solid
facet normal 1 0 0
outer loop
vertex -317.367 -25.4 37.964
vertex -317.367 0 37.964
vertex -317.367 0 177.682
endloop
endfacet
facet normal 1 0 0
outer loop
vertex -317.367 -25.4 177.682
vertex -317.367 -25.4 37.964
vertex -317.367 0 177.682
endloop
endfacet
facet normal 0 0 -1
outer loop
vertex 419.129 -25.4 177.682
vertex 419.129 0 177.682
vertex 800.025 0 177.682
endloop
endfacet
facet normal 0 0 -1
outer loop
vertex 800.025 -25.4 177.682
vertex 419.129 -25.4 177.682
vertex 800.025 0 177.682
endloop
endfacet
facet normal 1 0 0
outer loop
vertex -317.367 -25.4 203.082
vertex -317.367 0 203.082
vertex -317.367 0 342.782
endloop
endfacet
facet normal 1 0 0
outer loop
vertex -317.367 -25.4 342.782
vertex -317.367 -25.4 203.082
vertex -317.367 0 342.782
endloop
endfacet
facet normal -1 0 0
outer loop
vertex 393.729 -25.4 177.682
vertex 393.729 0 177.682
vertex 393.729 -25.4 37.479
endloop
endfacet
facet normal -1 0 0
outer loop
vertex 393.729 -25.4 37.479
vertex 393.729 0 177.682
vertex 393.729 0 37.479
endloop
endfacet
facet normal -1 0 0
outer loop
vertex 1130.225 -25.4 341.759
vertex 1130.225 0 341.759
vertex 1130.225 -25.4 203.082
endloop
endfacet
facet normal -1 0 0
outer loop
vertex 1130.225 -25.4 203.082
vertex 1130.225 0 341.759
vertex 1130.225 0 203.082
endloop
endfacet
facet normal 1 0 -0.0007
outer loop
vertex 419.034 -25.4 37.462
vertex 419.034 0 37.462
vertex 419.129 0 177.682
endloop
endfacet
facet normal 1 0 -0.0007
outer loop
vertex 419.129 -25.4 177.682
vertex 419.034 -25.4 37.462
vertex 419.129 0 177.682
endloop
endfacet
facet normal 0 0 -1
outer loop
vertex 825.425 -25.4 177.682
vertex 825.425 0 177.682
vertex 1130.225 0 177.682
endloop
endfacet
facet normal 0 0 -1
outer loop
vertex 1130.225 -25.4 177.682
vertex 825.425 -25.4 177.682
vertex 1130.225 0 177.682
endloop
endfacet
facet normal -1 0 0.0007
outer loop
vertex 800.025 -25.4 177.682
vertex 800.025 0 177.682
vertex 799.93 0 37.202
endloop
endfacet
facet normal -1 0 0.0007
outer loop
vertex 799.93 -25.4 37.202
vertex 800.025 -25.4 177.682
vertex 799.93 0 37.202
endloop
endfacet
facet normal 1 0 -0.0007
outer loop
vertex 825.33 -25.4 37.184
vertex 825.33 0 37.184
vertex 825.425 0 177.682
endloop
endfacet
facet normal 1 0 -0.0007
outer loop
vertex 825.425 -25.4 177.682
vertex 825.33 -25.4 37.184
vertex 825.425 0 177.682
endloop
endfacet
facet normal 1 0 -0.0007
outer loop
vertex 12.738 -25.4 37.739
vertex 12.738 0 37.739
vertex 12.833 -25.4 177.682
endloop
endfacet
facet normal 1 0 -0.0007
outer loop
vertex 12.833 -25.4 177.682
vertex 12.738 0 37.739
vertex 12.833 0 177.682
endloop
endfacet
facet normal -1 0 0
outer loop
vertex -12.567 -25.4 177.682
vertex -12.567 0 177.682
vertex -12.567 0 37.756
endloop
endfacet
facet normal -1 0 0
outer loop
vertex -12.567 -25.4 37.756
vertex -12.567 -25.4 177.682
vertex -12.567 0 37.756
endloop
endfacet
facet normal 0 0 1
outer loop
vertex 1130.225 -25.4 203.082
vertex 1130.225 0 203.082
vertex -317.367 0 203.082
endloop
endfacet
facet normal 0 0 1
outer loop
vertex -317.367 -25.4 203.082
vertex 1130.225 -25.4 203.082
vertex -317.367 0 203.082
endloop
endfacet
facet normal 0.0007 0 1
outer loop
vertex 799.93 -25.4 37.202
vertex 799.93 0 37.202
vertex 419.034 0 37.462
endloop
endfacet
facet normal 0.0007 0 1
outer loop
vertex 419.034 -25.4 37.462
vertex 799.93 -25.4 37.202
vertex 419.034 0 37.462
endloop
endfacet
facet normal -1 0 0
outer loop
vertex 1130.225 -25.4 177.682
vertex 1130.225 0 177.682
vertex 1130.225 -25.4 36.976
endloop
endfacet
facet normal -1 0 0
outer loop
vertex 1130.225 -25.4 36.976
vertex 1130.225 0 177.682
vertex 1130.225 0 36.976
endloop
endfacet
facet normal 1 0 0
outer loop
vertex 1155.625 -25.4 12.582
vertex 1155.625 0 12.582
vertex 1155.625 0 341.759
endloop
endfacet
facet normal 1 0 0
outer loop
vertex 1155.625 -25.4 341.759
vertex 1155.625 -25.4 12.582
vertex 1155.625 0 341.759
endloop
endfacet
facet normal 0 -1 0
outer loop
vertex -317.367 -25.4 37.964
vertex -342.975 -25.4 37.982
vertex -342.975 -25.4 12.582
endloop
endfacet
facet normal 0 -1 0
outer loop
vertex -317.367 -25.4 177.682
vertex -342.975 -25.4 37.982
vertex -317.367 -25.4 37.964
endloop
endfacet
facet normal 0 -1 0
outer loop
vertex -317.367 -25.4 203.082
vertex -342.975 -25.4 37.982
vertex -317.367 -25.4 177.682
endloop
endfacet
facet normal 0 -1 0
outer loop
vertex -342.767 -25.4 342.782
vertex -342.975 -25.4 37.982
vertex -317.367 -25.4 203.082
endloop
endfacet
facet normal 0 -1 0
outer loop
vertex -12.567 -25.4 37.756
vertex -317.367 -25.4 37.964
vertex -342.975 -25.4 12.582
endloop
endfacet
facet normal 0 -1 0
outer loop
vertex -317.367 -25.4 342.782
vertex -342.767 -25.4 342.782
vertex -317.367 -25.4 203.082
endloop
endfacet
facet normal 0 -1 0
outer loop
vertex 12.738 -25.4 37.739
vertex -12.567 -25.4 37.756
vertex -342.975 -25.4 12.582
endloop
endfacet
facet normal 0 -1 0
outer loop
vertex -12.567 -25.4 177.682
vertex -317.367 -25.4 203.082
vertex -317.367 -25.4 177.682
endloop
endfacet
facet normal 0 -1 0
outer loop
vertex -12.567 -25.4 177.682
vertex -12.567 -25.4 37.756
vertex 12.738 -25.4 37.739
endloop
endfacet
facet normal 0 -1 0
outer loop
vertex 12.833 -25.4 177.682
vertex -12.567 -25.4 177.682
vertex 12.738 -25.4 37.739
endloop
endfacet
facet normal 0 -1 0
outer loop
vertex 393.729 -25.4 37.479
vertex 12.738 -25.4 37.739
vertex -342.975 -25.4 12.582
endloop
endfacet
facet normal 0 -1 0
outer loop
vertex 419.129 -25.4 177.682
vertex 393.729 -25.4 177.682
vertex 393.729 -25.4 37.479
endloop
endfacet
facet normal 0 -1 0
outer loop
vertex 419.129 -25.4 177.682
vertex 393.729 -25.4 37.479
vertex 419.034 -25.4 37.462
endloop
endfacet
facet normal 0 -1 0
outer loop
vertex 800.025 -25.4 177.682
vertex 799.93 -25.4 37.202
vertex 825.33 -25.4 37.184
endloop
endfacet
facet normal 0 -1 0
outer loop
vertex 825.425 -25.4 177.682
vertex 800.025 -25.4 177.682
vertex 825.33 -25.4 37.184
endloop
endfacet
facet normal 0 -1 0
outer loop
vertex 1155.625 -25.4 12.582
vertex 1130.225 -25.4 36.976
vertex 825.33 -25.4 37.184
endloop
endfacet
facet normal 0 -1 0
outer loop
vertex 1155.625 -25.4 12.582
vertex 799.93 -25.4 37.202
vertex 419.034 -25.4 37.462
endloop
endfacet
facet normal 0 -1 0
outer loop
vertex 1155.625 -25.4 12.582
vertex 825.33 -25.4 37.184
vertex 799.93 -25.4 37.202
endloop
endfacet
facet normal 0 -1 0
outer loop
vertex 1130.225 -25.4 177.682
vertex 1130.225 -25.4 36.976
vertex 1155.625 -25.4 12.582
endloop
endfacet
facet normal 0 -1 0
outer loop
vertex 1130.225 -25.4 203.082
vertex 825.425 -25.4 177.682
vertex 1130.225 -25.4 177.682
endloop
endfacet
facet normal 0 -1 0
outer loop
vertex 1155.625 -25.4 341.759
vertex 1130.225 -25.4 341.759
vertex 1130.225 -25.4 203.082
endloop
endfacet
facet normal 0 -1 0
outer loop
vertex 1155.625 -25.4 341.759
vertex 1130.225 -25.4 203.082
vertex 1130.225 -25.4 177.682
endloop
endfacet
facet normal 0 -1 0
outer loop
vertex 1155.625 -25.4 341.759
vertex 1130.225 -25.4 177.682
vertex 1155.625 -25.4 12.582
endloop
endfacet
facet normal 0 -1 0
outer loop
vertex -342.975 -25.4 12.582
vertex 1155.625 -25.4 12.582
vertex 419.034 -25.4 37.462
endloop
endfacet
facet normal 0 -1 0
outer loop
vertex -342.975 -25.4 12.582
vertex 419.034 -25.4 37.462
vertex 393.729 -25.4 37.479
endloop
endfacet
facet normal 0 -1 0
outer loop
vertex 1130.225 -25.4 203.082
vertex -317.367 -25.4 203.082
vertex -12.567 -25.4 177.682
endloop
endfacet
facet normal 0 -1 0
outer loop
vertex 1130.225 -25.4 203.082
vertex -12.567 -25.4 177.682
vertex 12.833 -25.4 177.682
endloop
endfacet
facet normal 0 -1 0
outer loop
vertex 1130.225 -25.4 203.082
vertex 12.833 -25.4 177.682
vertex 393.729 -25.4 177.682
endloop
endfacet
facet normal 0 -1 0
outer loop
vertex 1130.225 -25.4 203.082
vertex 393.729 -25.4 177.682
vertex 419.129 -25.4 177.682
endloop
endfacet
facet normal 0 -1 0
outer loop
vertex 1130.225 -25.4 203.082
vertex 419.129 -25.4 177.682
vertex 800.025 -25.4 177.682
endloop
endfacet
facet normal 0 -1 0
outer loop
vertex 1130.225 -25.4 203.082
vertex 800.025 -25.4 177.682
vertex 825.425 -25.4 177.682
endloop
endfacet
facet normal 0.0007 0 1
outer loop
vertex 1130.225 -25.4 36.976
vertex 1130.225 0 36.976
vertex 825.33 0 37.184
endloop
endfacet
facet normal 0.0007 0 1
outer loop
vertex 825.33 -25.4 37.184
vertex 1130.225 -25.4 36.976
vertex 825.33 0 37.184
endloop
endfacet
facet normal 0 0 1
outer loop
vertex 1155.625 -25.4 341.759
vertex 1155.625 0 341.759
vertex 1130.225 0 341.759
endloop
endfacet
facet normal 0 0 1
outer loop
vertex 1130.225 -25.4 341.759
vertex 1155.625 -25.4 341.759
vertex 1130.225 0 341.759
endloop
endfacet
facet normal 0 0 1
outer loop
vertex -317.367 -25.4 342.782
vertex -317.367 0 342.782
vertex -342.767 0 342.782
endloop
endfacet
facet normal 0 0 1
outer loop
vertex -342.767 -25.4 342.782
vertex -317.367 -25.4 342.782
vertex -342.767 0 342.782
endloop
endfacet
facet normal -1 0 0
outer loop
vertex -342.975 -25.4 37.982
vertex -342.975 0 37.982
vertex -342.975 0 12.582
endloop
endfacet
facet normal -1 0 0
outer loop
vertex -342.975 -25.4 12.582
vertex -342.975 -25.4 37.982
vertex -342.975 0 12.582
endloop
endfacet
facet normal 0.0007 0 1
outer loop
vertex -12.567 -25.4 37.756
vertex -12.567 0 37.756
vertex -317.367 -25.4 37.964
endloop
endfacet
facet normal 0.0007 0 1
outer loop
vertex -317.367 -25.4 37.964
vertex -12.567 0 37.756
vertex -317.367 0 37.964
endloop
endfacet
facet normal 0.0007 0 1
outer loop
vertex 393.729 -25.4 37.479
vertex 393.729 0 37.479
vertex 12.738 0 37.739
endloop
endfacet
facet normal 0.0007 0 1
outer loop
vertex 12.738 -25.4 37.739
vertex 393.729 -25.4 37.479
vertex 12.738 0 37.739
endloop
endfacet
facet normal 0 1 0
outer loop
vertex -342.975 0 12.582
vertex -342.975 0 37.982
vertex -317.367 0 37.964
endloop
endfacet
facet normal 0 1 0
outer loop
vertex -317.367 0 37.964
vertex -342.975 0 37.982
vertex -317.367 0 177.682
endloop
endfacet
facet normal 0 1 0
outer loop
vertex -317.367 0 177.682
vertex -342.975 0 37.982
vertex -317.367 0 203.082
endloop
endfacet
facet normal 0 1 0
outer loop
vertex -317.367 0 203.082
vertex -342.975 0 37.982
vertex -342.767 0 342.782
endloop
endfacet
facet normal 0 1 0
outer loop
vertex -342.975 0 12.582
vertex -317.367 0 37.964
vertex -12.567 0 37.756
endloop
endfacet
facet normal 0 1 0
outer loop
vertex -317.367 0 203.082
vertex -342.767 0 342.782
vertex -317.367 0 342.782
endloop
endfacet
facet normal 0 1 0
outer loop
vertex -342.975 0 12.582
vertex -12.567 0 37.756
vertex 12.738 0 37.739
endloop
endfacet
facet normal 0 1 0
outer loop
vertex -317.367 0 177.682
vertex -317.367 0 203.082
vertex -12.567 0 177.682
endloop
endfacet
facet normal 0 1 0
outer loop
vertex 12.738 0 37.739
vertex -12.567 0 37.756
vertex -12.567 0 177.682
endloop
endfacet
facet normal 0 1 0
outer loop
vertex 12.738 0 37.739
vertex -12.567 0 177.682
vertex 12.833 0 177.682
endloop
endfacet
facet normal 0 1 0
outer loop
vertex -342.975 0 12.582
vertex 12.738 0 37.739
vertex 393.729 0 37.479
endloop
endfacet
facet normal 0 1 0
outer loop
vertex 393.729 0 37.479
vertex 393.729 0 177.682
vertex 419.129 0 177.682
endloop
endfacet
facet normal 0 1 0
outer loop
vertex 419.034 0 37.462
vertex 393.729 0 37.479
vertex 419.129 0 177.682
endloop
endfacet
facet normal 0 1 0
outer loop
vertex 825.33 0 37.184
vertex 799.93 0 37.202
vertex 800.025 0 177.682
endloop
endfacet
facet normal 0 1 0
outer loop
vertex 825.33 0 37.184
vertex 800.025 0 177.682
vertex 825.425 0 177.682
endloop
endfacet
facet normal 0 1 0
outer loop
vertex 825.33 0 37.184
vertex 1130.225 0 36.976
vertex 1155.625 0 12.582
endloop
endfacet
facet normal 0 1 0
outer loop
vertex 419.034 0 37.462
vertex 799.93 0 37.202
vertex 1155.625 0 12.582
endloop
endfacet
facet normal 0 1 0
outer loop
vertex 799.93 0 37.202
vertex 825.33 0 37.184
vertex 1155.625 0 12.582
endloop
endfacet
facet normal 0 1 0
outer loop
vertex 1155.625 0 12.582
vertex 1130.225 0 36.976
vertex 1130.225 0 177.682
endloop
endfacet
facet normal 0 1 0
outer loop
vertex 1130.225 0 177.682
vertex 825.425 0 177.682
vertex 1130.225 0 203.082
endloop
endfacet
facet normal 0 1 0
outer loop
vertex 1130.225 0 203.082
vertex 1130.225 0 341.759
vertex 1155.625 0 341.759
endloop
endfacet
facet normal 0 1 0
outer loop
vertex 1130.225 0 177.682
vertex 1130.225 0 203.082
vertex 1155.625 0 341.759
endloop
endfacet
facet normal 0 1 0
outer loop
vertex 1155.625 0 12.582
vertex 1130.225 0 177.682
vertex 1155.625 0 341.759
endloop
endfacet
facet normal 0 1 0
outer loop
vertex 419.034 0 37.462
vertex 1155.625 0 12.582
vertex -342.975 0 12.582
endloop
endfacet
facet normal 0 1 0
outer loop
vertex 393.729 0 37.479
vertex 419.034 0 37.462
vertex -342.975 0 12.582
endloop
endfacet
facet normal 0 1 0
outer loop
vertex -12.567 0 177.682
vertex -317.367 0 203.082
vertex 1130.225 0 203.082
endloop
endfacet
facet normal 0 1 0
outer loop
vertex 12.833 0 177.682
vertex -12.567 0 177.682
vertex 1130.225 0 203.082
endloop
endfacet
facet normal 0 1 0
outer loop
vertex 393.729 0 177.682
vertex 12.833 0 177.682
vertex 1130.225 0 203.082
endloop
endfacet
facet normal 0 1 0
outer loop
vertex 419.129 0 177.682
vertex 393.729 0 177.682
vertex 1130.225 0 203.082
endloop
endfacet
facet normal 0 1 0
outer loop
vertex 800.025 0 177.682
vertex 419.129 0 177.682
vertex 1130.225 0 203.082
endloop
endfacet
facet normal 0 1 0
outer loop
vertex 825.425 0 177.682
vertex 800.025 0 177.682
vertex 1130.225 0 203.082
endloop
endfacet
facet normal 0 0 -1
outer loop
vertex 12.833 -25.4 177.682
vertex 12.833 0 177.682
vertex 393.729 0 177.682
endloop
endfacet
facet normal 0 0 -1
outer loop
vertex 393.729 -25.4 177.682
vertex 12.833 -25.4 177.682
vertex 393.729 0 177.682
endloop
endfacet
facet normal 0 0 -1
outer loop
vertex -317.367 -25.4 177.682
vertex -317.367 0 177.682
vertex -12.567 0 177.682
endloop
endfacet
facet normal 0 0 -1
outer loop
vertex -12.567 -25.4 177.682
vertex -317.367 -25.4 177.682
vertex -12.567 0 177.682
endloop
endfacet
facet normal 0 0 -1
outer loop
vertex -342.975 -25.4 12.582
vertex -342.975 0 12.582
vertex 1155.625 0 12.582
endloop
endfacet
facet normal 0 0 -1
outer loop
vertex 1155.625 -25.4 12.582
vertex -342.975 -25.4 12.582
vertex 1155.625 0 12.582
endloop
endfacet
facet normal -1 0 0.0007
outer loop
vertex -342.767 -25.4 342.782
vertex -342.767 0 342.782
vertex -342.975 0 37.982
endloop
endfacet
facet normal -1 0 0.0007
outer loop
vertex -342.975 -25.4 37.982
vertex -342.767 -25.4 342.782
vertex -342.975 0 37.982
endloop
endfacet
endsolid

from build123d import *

# Parameters (mm, degrees)
F1_DEPTH = 25.4


with BuildPart() as f1:
    # F0 (on Front) → F1 (new body)
    with BuildSketch(Plane.XZ):
        Polygon((-342.974587, 37.98175), (-342.974587, 12.58175), (-317.366544, 12.58175), (-317.366544, 37.964271), align=None)
        Polygon((-342.766544, 342.78175), (-342.974587, 37.98175), (-317.366544, 37.964271), (-317.366544, 177.68175), (-317.366544, 203.08175), (-317.366544, 342.78175), align=None)
        Polygon((1130.225413, 36.976212), (1155.625413, 36.958875), (1155.625413, 341.758875), (1130.225413, 341.758875), (1130.225413, 203.08175), (1130.225413, 177.68175), align=None)
        Polygon((-317.366544, 37.964271), (-317.366544, 12.58175), (1155.625413, 12.58175), (1155.625413, 36.958875), (1130.225413, 36.976212), (825.329516, 37.184319), (799.929528, 37.201656), (419.033727, 37.461638), (406.325413, 37.470312), (393.729435, 37.47891), (12.737937, 37.738957), (-12.566544, 37.756228), align=None)
        Polygon((-317.366544, 203.08175), (-317.366544, 177.68175), (-12.566544, 177.68175), (12.833456, 177.68175), (393.729435, 177.68175), (406.429435, 177.68175), (419.129435, 177.68175), (800.025413, 177.68175), (825.425413, 177.68175), (1130.225413, 177.68175), (1130.225413, 203.08175), align=None)
        Polygon((-12.566544, 177.68175), (-12.566544, 37.756228), (12.737937, 37.738957), (12.833456, 177.68175), align=None)
        Polygon((406.429435, 177.68175), (406.325413, 37.470312), (419.033727, 37.461638), (419.129435, 177.68175), align=None)
        Polygon((393.729435, 177.68175), (393.729435, 37.47891), (406.325413, 37.470312), (406.429435, 177.68175), align=None)
        Polygon((799.929528, 37.201656), (825.329516, 37.184319), (825.425413, 177.68175), (800.025413, 177.68175), align=None)
    extrude(amount=F1_DEPTH)


solid = f1.part
